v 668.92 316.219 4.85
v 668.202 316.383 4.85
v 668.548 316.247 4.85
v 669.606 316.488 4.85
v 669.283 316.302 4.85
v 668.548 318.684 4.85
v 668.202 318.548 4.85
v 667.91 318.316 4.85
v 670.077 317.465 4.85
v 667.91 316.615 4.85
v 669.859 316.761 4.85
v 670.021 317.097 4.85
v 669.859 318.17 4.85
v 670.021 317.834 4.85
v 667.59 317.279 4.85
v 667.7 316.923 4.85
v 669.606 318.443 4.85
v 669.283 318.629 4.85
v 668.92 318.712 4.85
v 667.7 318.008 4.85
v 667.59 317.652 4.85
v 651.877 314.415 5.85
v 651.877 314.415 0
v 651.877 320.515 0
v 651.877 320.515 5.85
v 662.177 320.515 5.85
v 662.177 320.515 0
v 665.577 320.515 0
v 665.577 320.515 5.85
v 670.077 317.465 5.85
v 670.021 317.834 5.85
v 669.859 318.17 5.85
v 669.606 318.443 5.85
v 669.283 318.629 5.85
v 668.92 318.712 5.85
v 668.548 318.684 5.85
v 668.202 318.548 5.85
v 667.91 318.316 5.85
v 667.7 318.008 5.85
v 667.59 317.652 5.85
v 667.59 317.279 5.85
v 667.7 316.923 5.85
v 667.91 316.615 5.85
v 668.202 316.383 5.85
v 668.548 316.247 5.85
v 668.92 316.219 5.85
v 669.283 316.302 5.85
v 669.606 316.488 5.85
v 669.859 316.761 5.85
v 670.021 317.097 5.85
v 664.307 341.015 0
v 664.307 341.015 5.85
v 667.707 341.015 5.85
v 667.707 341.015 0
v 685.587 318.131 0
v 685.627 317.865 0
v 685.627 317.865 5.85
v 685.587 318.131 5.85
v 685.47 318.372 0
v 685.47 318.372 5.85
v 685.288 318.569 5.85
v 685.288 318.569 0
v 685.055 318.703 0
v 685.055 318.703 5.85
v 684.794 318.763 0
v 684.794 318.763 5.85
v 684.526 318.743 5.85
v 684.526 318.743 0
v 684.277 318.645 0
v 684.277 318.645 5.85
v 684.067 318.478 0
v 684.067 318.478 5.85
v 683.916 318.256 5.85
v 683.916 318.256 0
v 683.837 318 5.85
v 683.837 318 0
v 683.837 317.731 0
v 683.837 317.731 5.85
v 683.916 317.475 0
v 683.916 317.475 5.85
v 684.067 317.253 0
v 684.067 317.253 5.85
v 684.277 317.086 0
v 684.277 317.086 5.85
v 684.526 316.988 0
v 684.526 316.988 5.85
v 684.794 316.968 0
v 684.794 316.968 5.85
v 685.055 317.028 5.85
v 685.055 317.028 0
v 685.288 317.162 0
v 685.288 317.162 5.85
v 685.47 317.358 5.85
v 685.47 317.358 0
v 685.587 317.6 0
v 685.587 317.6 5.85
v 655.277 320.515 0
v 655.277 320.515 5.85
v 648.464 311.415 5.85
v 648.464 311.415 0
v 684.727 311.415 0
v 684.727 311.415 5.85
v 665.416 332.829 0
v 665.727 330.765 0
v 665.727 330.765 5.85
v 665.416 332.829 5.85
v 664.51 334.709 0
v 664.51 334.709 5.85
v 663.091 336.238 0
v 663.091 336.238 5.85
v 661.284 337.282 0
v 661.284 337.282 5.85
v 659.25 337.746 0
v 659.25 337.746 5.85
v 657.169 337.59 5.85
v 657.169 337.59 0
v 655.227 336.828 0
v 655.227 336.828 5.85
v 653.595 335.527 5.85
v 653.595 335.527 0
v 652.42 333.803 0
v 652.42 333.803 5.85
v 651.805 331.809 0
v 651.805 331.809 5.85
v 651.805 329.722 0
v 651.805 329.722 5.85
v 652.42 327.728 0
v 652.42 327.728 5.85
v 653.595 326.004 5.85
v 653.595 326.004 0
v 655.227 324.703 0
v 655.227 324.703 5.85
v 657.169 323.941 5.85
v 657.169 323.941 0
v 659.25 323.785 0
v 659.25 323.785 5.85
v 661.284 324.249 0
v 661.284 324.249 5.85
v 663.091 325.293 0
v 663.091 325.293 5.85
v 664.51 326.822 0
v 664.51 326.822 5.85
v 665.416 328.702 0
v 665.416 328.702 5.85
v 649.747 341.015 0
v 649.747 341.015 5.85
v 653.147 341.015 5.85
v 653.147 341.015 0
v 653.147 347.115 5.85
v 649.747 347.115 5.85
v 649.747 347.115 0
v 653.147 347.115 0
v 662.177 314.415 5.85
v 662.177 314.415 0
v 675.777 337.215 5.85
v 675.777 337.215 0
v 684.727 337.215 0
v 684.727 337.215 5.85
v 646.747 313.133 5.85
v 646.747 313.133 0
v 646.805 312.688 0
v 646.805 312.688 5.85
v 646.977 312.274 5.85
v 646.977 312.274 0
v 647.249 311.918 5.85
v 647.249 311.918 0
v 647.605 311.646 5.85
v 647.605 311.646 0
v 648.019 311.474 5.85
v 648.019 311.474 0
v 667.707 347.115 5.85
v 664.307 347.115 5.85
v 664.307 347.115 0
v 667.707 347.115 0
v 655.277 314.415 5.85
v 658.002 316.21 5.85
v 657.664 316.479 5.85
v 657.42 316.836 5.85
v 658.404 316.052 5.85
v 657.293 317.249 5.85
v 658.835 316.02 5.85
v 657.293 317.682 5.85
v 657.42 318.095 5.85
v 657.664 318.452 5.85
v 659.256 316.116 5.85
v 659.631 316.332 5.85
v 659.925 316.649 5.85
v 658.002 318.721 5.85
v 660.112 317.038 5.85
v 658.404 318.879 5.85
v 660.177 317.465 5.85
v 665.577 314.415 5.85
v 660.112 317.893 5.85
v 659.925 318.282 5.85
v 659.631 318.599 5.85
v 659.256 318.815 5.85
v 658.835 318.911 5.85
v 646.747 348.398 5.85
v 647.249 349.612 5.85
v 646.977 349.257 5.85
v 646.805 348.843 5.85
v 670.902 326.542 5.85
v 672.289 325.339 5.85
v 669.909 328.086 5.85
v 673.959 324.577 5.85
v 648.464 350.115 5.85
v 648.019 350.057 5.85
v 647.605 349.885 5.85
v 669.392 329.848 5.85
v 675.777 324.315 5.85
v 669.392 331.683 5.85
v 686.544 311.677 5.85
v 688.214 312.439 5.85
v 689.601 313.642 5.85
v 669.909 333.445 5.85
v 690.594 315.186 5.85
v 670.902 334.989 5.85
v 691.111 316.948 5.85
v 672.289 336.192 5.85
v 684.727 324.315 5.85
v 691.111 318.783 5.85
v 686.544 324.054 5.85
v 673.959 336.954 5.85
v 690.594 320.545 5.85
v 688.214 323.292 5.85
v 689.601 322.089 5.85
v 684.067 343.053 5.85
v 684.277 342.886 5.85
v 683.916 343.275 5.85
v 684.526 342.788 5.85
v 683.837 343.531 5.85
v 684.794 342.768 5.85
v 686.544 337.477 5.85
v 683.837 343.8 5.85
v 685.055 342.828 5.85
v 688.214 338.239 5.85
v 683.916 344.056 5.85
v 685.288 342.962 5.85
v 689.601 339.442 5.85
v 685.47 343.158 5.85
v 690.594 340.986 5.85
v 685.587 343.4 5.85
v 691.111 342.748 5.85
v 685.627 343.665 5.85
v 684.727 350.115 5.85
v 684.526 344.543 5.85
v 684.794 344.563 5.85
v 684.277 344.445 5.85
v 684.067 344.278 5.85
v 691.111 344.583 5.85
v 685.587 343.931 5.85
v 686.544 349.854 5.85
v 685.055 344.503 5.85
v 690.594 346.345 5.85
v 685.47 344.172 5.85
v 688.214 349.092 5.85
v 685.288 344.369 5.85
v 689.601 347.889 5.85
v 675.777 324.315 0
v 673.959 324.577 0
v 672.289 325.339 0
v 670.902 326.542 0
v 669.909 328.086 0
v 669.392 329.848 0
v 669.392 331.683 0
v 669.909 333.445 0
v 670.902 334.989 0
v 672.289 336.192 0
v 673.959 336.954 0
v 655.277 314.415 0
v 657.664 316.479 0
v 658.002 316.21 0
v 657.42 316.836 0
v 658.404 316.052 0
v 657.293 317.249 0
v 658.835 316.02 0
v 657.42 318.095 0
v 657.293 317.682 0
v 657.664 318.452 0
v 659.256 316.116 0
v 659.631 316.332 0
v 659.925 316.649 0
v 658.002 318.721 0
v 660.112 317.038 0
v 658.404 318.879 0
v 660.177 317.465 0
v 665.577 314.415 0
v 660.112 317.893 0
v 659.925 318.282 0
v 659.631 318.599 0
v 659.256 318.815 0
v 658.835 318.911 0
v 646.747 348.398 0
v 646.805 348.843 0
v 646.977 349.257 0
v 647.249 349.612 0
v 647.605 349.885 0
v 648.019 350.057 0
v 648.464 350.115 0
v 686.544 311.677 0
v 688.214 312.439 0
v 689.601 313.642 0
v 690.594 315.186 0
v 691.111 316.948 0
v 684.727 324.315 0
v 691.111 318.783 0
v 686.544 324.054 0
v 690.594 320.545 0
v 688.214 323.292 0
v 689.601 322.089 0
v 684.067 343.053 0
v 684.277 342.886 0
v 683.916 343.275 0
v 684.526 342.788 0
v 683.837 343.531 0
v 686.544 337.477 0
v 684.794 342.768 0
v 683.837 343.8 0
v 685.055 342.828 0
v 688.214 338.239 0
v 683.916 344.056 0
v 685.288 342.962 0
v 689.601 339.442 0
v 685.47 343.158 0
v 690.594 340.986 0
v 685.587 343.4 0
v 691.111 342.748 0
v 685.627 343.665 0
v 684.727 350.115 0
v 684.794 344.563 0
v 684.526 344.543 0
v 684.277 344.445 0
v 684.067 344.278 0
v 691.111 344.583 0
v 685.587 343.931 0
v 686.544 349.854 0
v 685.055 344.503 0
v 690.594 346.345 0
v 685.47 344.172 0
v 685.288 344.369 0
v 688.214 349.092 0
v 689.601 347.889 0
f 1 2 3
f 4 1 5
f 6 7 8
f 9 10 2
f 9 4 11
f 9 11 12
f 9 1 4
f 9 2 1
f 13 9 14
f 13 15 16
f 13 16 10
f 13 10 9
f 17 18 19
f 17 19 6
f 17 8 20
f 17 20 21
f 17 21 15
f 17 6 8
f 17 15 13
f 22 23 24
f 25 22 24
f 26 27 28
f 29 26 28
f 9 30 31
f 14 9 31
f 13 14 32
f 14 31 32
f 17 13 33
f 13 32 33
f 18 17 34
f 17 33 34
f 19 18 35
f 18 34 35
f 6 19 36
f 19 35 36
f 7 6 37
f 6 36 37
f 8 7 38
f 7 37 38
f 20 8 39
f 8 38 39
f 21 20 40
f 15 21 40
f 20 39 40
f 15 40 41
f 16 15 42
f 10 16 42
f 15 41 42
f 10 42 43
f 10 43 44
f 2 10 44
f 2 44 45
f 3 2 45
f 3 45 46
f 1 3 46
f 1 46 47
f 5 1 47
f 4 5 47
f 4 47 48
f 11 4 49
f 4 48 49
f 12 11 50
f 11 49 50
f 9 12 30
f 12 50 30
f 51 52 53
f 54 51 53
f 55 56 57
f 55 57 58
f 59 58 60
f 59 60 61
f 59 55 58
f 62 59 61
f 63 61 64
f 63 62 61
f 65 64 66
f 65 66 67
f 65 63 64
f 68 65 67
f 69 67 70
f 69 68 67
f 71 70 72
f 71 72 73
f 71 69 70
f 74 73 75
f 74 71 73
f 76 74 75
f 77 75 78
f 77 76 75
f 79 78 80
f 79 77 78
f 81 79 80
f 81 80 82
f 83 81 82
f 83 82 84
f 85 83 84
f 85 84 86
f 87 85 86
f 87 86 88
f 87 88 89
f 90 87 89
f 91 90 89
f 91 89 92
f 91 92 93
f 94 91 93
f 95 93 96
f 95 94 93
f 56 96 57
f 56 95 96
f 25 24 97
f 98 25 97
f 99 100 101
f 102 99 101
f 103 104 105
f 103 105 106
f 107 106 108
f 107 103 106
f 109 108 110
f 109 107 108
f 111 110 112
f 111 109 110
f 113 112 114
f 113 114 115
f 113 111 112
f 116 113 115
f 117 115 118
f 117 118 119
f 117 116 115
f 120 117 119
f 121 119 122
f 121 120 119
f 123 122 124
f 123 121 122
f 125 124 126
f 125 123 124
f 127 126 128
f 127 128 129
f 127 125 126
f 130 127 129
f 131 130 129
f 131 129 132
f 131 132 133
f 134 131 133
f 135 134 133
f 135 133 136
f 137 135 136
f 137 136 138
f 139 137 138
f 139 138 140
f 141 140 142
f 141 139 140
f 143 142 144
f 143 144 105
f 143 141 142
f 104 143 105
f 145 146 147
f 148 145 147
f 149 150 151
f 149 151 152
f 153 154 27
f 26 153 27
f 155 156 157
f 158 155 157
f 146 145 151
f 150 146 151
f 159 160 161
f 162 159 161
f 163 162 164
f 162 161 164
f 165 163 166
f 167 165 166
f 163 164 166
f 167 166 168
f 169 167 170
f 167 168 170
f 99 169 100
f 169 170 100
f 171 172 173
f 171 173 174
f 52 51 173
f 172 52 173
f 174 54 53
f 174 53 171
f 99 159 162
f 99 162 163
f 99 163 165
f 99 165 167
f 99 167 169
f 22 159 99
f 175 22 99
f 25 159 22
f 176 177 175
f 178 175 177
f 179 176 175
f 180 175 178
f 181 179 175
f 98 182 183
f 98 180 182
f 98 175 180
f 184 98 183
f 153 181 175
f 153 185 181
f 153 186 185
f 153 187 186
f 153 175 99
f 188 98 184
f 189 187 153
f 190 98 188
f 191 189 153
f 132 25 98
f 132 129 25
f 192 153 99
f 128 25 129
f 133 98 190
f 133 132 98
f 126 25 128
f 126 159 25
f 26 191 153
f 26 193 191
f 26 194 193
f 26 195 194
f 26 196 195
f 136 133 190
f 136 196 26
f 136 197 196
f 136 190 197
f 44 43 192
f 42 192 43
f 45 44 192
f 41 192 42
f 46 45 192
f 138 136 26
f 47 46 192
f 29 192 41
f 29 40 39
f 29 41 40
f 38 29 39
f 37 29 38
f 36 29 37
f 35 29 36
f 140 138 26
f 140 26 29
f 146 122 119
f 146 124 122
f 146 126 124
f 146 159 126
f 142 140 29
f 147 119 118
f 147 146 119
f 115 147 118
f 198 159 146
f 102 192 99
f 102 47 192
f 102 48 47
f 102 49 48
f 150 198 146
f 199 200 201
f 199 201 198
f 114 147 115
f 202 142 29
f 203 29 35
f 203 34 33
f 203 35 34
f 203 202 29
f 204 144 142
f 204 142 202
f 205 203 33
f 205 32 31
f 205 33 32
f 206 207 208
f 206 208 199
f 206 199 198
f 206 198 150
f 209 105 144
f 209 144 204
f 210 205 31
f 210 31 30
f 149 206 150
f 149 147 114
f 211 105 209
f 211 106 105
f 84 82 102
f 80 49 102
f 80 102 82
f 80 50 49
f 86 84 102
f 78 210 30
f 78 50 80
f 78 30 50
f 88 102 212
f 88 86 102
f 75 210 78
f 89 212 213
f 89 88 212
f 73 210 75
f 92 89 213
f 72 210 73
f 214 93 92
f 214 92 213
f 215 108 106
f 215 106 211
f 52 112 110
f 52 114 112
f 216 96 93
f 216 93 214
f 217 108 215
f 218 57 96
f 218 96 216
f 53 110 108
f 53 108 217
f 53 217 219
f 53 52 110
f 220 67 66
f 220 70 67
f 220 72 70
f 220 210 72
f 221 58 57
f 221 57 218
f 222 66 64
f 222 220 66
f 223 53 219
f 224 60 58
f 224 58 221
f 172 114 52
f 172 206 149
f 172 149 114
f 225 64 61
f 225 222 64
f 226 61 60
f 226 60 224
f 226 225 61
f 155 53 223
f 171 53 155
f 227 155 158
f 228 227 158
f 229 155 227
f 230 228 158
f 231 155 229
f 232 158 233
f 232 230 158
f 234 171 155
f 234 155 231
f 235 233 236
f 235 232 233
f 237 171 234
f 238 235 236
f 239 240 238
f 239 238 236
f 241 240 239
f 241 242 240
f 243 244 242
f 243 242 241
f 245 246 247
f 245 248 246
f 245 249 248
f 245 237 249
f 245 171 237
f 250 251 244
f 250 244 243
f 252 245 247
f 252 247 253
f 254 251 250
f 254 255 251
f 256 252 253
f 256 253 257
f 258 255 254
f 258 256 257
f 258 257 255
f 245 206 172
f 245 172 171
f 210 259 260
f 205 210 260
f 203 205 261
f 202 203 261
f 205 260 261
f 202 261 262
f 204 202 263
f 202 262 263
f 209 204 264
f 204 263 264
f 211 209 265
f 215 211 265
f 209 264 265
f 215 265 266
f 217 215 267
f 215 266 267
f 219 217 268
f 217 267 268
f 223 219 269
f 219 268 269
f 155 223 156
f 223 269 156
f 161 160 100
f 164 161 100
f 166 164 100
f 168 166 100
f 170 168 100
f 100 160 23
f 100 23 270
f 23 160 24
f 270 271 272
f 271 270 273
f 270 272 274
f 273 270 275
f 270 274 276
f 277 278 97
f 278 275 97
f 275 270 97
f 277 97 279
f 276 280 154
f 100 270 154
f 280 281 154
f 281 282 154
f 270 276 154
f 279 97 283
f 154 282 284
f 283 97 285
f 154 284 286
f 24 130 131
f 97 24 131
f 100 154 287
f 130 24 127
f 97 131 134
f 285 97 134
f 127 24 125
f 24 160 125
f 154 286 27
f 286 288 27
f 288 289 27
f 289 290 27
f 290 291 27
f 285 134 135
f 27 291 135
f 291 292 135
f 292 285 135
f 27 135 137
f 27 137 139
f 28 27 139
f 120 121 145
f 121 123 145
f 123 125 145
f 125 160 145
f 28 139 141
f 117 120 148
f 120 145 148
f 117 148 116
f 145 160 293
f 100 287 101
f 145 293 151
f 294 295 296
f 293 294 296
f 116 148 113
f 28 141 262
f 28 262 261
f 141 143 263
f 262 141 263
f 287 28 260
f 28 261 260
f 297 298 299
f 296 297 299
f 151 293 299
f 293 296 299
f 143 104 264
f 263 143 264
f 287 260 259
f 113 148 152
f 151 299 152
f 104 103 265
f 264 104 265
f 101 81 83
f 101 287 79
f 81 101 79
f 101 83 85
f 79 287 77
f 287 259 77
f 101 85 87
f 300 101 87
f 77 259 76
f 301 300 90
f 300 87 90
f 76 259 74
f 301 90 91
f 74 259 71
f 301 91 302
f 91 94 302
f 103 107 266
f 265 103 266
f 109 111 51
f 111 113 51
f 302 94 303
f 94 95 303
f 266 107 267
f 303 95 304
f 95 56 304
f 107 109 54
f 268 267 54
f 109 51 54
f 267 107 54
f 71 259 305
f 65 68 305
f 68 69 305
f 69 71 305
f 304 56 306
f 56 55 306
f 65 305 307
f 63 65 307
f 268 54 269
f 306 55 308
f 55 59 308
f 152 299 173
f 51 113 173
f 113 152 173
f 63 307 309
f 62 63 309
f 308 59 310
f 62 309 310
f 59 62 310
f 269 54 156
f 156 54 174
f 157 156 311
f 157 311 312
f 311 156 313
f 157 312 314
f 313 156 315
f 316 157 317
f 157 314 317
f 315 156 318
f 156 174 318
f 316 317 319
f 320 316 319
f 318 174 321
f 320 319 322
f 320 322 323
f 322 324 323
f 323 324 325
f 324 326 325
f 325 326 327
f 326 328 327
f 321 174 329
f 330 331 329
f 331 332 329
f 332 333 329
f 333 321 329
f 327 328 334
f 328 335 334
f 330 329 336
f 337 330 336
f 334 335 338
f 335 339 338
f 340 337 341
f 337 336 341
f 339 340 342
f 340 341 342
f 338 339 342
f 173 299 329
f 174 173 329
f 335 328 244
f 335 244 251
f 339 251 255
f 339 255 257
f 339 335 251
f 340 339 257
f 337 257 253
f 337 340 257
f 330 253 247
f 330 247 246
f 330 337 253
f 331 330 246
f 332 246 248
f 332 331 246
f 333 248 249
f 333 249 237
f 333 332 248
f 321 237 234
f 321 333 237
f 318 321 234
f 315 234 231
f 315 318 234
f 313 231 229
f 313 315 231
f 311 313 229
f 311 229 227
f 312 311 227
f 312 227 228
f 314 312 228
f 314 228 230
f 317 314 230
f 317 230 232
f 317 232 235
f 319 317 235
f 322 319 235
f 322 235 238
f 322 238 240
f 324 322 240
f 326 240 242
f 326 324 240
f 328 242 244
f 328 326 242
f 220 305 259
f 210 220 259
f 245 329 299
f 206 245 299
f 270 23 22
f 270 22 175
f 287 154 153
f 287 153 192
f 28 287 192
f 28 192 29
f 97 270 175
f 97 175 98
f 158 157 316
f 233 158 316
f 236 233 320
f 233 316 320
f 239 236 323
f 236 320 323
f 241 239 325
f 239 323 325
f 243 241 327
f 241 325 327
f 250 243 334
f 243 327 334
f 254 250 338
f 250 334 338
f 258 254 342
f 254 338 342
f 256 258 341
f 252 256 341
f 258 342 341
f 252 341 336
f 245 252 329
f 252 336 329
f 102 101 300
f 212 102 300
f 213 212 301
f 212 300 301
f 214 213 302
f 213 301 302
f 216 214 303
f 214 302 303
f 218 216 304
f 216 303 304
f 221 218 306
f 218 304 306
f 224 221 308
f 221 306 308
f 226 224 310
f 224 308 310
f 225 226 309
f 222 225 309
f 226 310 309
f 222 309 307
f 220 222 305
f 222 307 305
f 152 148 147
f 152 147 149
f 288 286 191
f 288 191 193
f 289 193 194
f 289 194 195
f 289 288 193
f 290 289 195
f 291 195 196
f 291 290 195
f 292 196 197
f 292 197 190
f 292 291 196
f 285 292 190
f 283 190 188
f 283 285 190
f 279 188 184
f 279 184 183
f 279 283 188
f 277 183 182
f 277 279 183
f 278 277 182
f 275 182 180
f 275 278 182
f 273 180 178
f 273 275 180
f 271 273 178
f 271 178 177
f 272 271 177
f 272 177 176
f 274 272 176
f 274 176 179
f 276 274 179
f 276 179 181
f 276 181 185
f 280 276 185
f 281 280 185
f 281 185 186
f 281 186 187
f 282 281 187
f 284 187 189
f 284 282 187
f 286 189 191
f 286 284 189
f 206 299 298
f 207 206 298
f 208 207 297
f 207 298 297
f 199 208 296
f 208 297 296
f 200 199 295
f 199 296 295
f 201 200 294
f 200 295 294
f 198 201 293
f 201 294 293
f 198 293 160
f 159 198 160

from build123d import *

# Parameters (mm, degrees)
SKETCH1_R           = 0.9
SKETCH1_R_2         = 1.45
SKETCH1_R_3         = 7
SKETCH1_W           = 3.400011
SKETCH1_H           = 6.1
SKETCH1_W_2         = 3.4
BOSS_EXTRUDE2_DEPTH = 5.85
SKETCH2_R           = 1.25
CUT_EXTRUDE1_DEPTH  = 1


with BuildPart() as part:
    # Sketch1 → Boss-Extrude2 (new body)
    with BuildSketch(Plane.XY):
        with BuildLine():
            Line((669.21684417, 350.11545661), (648.4638119, 350.11545661))
            ThreePointArc((648.4638119, 350.11545661), (647.249496344, 349.612470637), (646.746510371, 348.398155081))
            Line((646.746510371, 348.398155081), (646.746510371, 313.132758138))
            ThreePointArc((646.746510371, 313.132758138), (647.249496344, 311.918442582), (648.4638119, 311.41545661))
            Line((648.4638119, 311.41545661), (669.21684417, 311.41545661))
            Line((669.21684417, 311.41545661), (684.726521371, 311.41545661))
            ThreePointArc((684.726521371, 311.41545661), (691.176521371, 317.86545661), (684.726521371, 324.31545661))
            Line((684.726521371, 324.31545661), (675.776521371, 324.31545661))
            ThreePointArc((675.776521371, 324.31545661), (669.326521371, 330.76545661), (675.776521371, 337.21545661))
            Line((675.776521371, 337.21545661), (684.726521371, 337.21545661))
            ThreePointArc((684.726521371, 337.21545661), (691.176521371, 343.66545661), (684.726521371, 350.11545661))
            Line((684.726521371, 350.11545661), (669.21684417, 350.11545661))
        make_face()
        with Locations((684.726521371, 343.66545661)):
            Circle(SKETCH1_R, mode=Mode.SUBTRACT)
        with Locations((684.726521371, 317.86545661)):
            Circle(SKETCH1_R, mode=Mode.SUBTRACT)
        with Locations((658.726521371, 317.46545661)):
            Circle(SKETCH1_R_2, mode=Mode.SUBTRACT)
        with Locations((658.726521371, 330.76545661)):
            Circle(SKETCH1_R_3, mode=Mode.SUBTRACT)
        with Locations((651.446515871, 344.06545661)):
            Rectangle(SKETCH1_W, SKETCH1_H, mode=Mode.SUBTRACT)
        with Locations((653.576521371, 317.46545661)):
            Rectangle(SKETCH1_W_2, SKETCH1_H, mode=Mode.SUBTRACT)
        with Locations((666.006526871, 344.06545661)):
            Rectangle(SKETCH1_W, SKETCH1_H, mode=Mode.SUBTRACT)
        with Locations((663.876521371, 317.46545661)):
            Rectangle(SKETCH1_W_2, SKETCH1_H, mode=Mode.SUBTRACT)
    extrude(amount=BOSS_EXTRUDE2_DEPTH)

    # Sketch2 → Cut-Extrude1 (cut)
    with BuildSketch(Plane.XY.offset(5.85)):
        with Locations((668.826521371, 317.46545661)):
            Circle(SKETCH2_R)
    extrude(amount=-CUT_EXTRUDE1_DEPTH, mode=Mode.SUBTRACT)


solid = part.part
